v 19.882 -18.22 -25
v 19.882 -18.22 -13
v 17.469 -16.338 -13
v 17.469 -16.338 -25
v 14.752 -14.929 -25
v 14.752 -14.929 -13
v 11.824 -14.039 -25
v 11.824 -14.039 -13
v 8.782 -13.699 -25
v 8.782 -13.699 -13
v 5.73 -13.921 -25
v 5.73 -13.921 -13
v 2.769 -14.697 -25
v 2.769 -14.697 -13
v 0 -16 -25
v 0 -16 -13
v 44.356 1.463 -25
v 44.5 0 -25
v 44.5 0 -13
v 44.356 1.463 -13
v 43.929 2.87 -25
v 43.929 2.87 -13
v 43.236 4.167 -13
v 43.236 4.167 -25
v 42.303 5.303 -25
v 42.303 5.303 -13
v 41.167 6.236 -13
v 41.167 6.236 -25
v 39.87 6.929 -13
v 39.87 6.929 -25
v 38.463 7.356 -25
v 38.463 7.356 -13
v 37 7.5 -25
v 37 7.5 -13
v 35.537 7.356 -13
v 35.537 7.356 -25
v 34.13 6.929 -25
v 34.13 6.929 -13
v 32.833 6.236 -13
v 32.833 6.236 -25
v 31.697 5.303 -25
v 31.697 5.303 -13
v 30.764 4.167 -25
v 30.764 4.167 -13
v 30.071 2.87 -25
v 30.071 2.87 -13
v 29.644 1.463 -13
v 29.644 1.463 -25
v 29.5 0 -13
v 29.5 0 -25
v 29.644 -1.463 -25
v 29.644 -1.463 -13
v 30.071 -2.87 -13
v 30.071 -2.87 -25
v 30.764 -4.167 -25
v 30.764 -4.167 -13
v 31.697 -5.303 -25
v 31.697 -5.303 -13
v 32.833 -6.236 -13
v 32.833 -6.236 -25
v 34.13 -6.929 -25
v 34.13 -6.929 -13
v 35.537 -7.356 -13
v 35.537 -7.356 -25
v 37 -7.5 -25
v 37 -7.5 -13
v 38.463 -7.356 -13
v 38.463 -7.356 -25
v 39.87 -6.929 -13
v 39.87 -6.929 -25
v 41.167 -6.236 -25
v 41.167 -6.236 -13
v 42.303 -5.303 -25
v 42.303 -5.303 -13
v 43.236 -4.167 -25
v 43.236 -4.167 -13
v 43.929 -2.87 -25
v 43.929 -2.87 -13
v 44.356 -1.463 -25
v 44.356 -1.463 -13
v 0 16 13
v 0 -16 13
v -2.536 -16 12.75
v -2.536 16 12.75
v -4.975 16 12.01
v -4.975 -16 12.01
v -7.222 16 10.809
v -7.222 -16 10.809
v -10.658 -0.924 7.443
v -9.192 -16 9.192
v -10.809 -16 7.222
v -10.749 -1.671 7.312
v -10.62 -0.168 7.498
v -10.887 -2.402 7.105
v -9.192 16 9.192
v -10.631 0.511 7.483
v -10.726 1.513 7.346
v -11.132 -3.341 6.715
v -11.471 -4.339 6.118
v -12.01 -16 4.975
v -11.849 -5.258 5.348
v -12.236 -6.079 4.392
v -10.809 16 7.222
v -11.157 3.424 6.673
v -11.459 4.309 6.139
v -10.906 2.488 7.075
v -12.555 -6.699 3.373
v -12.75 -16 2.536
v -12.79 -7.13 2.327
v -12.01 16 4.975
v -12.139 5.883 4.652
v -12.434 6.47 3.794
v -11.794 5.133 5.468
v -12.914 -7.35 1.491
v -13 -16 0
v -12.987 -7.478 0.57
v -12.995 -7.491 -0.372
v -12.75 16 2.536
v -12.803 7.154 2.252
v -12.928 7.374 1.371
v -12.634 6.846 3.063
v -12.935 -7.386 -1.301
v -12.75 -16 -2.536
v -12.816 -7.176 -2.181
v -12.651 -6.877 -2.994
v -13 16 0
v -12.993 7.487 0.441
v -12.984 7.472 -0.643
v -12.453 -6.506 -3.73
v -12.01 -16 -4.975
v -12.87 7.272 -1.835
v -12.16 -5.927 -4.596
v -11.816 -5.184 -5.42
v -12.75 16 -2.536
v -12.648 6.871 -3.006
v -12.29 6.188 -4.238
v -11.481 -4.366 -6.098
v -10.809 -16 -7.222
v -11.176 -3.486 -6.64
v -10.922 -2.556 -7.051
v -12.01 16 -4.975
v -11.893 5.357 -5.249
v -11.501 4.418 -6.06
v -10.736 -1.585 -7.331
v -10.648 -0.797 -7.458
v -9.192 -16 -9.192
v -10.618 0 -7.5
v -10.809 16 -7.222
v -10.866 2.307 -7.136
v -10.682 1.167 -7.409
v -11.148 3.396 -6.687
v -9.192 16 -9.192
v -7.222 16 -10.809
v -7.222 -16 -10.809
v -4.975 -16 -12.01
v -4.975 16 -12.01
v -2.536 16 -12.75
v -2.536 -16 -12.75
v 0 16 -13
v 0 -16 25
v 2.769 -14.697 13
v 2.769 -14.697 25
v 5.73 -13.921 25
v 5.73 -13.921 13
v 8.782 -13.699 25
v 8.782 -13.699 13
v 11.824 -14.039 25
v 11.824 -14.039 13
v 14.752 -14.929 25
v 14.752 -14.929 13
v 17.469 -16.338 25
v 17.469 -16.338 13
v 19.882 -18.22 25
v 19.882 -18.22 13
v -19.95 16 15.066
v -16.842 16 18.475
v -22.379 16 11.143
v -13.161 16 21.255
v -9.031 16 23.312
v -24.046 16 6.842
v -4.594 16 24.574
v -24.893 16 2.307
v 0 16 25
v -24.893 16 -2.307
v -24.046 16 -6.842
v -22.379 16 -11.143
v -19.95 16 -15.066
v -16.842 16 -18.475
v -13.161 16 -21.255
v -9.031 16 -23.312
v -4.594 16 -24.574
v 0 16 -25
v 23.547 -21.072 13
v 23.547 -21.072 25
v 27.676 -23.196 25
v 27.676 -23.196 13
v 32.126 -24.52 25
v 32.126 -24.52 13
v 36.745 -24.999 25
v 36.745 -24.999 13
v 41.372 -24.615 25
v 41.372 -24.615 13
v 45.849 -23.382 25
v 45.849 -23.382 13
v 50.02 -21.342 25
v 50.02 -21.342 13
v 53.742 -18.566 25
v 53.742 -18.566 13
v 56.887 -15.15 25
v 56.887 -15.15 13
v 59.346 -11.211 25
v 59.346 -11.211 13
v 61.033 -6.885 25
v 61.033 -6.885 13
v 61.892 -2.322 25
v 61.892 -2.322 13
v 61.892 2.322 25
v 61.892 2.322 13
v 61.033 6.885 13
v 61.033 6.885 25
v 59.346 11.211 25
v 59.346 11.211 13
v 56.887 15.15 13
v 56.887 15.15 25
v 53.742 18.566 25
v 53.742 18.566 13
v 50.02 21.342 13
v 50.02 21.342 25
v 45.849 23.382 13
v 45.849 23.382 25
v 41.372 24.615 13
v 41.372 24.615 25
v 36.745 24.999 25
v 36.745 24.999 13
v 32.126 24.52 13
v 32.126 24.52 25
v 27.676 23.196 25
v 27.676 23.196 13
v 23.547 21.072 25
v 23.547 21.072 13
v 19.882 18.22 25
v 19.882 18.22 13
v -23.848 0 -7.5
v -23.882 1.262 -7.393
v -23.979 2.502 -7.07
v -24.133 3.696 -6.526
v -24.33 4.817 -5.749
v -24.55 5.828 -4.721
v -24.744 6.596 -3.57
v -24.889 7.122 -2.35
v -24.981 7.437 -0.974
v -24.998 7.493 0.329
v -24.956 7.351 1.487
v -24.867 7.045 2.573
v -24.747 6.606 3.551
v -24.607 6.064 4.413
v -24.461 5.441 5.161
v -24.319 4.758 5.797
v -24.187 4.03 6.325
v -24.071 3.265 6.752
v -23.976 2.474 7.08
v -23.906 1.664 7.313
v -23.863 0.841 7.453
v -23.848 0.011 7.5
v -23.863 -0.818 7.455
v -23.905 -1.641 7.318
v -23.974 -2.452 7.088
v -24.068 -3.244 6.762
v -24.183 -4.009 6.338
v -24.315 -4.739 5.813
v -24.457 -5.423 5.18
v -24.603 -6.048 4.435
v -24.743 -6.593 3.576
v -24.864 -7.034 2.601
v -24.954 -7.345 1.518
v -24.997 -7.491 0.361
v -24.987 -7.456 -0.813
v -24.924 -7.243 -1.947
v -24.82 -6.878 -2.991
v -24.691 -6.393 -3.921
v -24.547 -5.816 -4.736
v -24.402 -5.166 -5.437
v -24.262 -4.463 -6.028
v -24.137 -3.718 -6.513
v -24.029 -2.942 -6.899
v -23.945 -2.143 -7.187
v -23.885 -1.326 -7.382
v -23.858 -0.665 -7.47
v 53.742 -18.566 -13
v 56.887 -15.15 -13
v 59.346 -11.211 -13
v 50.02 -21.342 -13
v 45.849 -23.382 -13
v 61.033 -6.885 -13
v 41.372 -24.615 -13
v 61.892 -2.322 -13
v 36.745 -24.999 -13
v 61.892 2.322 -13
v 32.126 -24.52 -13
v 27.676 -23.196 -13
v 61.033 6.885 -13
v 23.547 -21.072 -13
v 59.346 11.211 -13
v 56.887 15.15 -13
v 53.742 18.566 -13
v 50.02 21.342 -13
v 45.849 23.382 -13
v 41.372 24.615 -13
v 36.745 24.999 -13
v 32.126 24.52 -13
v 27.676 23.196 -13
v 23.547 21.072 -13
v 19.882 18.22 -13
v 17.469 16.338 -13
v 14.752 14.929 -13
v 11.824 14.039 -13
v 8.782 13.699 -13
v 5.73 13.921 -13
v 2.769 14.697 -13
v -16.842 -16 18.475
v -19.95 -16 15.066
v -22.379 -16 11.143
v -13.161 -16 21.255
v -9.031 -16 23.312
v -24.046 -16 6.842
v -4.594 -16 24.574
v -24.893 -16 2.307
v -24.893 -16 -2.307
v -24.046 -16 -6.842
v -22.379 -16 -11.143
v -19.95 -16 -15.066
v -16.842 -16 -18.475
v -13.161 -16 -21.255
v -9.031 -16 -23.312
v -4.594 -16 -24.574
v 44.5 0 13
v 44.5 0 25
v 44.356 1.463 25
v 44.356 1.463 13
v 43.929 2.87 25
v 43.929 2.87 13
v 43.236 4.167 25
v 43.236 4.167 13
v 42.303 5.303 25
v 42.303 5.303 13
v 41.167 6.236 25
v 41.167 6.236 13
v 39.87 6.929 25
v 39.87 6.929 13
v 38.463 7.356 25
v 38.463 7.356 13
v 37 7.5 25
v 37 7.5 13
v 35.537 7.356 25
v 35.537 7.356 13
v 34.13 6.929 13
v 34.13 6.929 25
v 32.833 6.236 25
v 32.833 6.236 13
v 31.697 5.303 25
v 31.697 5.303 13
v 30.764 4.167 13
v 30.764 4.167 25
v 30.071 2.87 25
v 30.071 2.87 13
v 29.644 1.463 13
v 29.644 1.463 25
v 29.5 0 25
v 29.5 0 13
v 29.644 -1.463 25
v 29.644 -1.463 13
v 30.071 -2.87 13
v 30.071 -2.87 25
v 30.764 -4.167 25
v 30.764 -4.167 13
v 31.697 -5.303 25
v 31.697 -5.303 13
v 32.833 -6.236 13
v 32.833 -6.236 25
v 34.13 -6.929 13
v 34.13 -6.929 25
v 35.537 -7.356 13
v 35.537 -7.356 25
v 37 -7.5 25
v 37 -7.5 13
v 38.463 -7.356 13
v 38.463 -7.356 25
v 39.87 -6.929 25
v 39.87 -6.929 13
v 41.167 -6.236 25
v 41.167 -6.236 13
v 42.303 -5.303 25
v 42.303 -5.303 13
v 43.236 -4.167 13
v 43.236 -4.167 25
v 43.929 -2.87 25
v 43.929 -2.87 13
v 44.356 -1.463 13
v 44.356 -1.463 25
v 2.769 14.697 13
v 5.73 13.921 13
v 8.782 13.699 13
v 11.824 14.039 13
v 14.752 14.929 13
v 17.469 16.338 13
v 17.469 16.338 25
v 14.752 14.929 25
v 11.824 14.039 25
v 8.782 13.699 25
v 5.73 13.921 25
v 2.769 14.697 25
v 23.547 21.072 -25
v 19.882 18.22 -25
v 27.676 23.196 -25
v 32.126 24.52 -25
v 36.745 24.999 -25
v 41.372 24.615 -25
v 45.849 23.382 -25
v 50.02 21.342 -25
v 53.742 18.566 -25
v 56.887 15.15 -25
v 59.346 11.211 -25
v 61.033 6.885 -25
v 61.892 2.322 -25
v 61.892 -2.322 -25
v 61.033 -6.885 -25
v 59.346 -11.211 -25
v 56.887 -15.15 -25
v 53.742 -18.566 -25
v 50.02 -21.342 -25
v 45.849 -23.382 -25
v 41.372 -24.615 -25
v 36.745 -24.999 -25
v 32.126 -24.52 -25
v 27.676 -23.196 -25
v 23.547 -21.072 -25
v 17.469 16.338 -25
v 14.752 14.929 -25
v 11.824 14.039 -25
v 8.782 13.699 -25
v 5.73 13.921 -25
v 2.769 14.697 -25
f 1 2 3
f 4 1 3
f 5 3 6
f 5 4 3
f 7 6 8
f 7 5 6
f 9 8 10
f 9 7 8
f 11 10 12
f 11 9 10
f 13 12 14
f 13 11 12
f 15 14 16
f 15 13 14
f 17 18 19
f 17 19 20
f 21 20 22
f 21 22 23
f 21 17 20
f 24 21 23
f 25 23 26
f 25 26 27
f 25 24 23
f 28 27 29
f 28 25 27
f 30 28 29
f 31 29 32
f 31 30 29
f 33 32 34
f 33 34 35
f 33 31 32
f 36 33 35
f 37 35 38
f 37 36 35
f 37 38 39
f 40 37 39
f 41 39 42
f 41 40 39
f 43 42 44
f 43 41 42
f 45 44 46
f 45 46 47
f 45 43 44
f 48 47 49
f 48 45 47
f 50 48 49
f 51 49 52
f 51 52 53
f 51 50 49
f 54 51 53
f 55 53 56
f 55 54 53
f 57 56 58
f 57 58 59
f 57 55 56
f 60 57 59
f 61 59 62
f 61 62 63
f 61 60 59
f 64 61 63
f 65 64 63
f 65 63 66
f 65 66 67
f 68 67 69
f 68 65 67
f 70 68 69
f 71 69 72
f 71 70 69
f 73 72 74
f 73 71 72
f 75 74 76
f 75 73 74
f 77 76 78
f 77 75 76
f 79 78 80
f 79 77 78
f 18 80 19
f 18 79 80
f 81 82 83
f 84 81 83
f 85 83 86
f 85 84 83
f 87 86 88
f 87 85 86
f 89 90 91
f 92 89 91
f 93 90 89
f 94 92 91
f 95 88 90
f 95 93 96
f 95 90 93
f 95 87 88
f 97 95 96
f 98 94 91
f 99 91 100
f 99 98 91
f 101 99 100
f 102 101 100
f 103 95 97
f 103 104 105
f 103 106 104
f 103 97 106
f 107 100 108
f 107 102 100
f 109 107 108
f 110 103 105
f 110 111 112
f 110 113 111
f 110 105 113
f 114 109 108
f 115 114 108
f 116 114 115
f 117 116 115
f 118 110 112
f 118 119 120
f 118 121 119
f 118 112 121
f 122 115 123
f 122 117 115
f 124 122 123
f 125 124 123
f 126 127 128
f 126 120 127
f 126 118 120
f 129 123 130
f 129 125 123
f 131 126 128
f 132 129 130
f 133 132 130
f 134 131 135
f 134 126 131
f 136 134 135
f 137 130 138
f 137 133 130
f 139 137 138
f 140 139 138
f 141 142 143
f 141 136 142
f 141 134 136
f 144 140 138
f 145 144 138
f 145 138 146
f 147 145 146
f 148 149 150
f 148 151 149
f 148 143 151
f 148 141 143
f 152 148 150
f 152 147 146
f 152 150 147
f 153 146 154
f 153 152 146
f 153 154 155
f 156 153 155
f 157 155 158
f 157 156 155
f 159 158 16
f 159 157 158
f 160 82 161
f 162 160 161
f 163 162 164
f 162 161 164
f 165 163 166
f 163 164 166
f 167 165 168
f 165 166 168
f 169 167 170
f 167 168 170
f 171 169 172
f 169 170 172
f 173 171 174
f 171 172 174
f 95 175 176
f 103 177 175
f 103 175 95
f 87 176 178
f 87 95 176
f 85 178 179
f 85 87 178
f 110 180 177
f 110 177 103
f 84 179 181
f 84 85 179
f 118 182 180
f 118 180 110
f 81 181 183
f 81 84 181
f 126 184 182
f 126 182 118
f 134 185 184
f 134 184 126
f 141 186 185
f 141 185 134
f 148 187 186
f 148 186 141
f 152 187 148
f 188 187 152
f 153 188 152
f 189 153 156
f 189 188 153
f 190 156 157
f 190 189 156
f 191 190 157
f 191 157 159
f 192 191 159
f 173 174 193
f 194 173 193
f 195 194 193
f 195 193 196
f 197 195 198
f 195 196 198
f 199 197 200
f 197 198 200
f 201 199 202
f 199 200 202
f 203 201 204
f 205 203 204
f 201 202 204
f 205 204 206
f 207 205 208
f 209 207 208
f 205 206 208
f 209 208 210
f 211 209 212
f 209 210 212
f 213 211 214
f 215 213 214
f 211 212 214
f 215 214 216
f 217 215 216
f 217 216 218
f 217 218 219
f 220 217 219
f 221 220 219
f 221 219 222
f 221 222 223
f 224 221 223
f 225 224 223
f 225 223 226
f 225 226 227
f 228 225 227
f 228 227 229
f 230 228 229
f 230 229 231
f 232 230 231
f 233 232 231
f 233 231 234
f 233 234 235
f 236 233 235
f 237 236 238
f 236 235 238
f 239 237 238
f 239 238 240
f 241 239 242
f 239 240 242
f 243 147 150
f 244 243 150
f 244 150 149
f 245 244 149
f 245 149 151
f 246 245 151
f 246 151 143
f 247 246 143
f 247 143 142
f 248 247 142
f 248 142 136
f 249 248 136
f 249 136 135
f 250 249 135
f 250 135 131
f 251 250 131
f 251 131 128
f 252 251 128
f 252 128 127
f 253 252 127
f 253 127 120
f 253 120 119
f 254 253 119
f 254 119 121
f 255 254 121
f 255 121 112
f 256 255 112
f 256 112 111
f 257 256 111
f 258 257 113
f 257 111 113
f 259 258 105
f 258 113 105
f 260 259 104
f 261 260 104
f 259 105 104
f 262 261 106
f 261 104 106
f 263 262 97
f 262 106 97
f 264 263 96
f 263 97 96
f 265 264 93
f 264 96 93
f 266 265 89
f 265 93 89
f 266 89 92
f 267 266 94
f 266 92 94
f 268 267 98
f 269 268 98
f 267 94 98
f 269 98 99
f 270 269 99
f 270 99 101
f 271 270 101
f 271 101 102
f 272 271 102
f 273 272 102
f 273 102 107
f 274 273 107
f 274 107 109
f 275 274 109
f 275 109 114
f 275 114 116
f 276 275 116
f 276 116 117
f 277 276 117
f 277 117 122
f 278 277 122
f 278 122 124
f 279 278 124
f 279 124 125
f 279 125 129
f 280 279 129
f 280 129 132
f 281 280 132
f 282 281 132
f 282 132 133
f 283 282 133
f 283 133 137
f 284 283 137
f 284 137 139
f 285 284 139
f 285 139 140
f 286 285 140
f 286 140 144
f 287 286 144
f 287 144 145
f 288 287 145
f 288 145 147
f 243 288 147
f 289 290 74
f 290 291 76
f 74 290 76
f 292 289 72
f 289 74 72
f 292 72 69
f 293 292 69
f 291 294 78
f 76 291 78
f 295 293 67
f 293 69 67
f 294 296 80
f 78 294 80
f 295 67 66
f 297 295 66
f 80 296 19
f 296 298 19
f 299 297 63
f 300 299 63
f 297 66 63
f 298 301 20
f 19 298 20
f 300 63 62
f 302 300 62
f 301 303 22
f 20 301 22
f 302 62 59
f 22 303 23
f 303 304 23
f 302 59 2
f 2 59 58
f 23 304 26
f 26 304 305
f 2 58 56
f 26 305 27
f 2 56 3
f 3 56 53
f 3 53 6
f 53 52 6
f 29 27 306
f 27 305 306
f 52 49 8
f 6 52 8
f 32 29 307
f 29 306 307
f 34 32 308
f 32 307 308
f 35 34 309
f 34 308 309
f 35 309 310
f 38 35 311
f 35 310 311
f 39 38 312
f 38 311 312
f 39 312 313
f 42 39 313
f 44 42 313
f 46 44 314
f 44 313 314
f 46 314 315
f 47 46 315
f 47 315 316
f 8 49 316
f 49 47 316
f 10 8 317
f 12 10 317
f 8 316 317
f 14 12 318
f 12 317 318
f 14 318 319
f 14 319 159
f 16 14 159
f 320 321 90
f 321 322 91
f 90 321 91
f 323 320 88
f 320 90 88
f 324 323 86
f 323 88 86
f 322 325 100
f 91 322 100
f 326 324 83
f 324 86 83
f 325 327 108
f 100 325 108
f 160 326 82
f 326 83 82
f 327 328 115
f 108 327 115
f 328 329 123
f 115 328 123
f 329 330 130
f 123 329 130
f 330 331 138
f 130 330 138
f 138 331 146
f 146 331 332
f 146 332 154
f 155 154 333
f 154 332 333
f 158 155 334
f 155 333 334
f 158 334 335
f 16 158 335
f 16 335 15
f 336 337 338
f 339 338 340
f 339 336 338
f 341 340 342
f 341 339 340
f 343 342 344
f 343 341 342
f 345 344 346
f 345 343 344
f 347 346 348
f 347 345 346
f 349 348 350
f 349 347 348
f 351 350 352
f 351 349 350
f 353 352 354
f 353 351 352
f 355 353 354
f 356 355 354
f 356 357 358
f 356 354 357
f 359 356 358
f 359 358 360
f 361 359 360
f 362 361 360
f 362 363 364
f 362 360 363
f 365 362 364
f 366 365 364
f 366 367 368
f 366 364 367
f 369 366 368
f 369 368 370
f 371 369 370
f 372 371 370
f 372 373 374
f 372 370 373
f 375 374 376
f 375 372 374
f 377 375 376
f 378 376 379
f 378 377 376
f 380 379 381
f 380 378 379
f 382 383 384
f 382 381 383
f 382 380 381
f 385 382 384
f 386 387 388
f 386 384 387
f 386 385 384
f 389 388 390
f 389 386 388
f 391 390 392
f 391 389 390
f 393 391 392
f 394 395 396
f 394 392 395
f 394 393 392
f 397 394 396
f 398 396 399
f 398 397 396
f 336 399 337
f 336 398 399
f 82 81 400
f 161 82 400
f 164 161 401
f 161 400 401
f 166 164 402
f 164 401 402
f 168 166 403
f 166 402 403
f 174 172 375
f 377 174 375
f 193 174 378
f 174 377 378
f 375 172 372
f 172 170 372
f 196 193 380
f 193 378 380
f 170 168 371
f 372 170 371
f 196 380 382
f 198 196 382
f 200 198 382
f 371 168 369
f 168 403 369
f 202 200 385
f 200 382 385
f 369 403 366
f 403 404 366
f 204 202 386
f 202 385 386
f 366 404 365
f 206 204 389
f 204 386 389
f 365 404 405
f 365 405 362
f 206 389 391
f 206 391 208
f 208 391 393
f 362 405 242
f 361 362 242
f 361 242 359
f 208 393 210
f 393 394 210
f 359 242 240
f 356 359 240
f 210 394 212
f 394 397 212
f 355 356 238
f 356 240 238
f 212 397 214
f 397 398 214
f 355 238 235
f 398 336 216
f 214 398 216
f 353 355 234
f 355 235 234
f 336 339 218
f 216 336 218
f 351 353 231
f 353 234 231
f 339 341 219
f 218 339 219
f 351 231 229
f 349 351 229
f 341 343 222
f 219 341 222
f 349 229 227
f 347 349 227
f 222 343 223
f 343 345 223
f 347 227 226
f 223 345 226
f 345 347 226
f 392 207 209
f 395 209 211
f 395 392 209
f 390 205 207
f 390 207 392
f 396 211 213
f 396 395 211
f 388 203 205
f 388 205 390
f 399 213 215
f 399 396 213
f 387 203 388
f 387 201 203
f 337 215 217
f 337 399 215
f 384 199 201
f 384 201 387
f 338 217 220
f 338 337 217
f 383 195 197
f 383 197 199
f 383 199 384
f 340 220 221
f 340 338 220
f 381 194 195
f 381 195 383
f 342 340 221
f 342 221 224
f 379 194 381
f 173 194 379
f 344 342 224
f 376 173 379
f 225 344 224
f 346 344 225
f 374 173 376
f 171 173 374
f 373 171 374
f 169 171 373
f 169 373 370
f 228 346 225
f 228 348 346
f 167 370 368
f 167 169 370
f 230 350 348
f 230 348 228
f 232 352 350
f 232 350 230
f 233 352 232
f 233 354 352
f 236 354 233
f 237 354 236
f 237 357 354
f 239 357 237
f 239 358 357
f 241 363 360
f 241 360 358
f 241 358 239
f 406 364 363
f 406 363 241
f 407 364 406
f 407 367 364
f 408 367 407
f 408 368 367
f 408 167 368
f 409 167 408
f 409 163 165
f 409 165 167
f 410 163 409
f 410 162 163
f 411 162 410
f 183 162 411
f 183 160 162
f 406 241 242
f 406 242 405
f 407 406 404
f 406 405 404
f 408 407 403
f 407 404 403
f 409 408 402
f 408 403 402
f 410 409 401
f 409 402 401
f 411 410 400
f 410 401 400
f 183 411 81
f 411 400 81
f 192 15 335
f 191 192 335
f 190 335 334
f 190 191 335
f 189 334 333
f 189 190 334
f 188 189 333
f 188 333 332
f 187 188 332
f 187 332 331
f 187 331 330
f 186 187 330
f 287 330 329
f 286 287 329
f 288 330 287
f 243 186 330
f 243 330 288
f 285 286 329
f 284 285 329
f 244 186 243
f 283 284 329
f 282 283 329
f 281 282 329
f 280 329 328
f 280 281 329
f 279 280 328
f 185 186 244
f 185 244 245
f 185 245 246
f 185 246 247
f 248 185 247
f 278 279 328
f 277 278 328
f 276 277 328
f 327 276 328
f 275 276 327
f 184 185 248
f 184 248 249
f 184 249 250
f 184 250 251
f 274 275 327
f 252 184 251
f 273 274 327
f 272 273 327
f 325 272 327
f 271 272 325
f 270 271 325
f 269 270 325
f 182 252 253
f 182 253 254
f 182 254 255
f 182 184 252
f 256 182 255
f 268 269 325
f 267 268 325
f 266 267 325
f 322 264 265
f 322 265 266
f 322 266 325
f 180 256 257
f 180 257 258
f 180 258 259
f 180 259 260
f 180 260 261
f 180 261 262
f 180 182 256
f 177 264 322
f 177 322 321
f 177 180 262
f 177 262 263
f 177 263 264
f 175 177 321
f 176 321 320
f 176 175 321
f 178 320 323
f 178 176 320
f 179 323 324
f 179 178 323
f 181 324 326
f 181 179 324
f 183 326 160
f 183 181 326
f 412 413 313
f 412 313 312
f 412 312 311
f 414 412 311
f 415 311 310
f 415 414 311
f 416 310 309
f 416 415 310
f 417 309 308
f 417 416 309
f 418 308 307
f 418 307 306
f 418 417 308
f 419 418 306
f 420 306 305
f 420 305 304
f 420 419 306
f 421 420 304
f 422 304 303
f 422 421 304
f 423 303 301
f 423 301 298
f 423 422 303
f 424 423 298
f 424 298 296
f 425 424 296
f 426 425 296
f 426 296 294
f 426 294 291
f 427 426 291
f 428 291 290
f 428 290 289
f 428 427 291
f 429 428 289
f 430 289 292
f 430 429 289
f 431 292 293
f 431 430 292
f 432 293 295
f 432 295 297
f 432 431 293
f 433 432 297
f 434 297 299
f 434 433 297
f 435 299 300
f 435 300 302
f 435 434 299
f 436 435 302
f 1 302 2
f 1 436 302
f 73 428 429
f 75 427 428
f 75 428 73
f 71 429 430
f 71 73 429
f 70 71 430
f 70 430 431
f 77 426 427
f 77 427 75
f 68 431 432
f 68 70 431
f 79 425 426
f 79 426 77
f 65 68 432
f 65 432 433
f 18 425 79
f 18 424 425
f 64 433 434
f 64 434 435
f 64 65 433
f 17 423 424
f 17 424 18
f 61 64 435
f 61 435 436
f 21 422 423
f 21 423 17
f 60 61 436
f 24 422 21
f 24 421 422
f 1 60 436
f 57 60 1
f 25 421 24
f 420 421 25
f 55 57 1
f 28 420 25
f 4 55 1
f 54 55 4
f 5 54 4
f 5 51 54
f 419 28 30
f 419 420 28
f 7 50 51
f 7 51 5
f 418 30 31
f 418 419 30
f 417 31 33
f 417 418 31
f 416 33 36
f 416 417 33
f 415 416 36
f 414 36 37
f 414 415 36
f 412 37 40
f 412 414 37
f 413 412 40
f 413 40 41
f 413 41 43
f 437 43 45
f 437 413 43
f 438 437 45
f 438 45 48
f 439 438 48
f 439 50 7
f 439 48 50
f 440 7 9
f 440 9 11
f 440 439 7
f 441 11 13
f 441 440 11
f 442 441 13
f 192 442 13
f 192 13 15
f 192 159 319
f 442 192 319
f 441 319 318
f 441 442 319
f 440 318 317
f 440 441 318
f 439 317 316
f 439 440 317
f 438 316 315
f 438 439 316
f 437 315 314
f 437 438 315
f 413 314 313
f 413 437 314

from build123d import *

# Parameters (mm, degrees)
BOSS_EXTRUDE1_DEPTH = 16
BOSS_EXTRUDE2_START = -27
SKETCH3_R           = 7.5
BOSS_EXTRUDE2_DEPTH = 27
SKETCH7_W           = 15
SKETCH7_H           = 50
CUT_EXTRUDE1_DEPTH  = 63
SKETCH8_R           = 7.5
BOSS_EXTRUDE6_DEPTH = 12
SKETCH9_R           = 7.5
CUT_EXTRUDE2_DEPTH  = 26


with BuildPart() as part:
    # Sketch1 → Boss-Extrude1 (new body, symmetric)
    with BuildSketch(Plane(origin=(0, 0, 0), x_dir=(1, 0, 0), z_dir=(0, 1, 0))):
        with BuildLine():
            Line((0, 13), (0, 25))
            ThreePointArc((0, 25), (-25, 0), (0, -25))
            Line((0, -25), (0, -13))
            ThreePointArc((0, -13), (-13, 0), (0, 13))
        make_face()
    extrude(amount=BOSS_EXTRUDE1_DEPTH, both=True)

    # Sketch3 → Boss-Extrude2 (add)
    with BuildSketch(Plane.XY.offset(40).offset(BOSS_EXTRUDE2_START)):
        with BuildLine():
            Line((0, 16), (0, -16))
            ThreePointArc((0, -16), (10.310830972, -13.799251334), (19.882176961, -18.220322017))
            ThreePointArc((19.882176961, -18.220322017), (62, 0), (19.882176961, 18.220322017))
            ThreePointArc((19.882176961, 18.220322017), (10.310830972, 13.799251334), (0, 16))
        make_face()
        with Locations((37, 0)):
            Circle(SKETCH3_R, mode=Mode.SUBTRACT)
    extrude(amount=BOSS_EXTRUDE2_DEPTH)

    # Sketch7 → Cut-Extrude1 (cut, through all)
    with BuildSketch(Plane.ZY):
        with Locations((32.5, 0)):
            Rectangle(SKETCH7_W, SKETCH7_H)
    extrude(amount=-CUT_EXTRUDE1_DEPTH, mode=Mode.SUBTRACT)

    # Sketch8 → Boss-Extrude6 (add)
    with BuildSketch(Plane.XY.offset(-25)):
        with BuildLine():
            Line((0, -16), (0, 16))
            ThreePointArc((0, 16), (10.310830972, 13.799251334), (19.882176961, 18.220322017))
            ThreePointArc((19.882176961, 18.220322017), (62, 0), (19.882176961, -18.220322017))
            ThreePointArc((19.882176961, -18.220322017), (10.310830972, -13.799251334), (0, -16))
        make_face()
        with Locations((37, 0)):
            Circle(SKETCH8_R, mode=Mode.SUBTRACT)
    extrude(amount=BOSS_EXTRUDE6_DEPTH)

    # Sketch9 → Cut-Extrude2 (cut, through all)
    with BuildSketch(Plane(origin=(0, 0, 0), x_dir=(0, 0, -1), z_dir=(1, 0, 0))):
        Circle(SKETCH9_R)
    extrude(amount=-CUT_EXTRUDE2_DEPTH, mode=Mode.SUBTRACT)


solid = part.part
